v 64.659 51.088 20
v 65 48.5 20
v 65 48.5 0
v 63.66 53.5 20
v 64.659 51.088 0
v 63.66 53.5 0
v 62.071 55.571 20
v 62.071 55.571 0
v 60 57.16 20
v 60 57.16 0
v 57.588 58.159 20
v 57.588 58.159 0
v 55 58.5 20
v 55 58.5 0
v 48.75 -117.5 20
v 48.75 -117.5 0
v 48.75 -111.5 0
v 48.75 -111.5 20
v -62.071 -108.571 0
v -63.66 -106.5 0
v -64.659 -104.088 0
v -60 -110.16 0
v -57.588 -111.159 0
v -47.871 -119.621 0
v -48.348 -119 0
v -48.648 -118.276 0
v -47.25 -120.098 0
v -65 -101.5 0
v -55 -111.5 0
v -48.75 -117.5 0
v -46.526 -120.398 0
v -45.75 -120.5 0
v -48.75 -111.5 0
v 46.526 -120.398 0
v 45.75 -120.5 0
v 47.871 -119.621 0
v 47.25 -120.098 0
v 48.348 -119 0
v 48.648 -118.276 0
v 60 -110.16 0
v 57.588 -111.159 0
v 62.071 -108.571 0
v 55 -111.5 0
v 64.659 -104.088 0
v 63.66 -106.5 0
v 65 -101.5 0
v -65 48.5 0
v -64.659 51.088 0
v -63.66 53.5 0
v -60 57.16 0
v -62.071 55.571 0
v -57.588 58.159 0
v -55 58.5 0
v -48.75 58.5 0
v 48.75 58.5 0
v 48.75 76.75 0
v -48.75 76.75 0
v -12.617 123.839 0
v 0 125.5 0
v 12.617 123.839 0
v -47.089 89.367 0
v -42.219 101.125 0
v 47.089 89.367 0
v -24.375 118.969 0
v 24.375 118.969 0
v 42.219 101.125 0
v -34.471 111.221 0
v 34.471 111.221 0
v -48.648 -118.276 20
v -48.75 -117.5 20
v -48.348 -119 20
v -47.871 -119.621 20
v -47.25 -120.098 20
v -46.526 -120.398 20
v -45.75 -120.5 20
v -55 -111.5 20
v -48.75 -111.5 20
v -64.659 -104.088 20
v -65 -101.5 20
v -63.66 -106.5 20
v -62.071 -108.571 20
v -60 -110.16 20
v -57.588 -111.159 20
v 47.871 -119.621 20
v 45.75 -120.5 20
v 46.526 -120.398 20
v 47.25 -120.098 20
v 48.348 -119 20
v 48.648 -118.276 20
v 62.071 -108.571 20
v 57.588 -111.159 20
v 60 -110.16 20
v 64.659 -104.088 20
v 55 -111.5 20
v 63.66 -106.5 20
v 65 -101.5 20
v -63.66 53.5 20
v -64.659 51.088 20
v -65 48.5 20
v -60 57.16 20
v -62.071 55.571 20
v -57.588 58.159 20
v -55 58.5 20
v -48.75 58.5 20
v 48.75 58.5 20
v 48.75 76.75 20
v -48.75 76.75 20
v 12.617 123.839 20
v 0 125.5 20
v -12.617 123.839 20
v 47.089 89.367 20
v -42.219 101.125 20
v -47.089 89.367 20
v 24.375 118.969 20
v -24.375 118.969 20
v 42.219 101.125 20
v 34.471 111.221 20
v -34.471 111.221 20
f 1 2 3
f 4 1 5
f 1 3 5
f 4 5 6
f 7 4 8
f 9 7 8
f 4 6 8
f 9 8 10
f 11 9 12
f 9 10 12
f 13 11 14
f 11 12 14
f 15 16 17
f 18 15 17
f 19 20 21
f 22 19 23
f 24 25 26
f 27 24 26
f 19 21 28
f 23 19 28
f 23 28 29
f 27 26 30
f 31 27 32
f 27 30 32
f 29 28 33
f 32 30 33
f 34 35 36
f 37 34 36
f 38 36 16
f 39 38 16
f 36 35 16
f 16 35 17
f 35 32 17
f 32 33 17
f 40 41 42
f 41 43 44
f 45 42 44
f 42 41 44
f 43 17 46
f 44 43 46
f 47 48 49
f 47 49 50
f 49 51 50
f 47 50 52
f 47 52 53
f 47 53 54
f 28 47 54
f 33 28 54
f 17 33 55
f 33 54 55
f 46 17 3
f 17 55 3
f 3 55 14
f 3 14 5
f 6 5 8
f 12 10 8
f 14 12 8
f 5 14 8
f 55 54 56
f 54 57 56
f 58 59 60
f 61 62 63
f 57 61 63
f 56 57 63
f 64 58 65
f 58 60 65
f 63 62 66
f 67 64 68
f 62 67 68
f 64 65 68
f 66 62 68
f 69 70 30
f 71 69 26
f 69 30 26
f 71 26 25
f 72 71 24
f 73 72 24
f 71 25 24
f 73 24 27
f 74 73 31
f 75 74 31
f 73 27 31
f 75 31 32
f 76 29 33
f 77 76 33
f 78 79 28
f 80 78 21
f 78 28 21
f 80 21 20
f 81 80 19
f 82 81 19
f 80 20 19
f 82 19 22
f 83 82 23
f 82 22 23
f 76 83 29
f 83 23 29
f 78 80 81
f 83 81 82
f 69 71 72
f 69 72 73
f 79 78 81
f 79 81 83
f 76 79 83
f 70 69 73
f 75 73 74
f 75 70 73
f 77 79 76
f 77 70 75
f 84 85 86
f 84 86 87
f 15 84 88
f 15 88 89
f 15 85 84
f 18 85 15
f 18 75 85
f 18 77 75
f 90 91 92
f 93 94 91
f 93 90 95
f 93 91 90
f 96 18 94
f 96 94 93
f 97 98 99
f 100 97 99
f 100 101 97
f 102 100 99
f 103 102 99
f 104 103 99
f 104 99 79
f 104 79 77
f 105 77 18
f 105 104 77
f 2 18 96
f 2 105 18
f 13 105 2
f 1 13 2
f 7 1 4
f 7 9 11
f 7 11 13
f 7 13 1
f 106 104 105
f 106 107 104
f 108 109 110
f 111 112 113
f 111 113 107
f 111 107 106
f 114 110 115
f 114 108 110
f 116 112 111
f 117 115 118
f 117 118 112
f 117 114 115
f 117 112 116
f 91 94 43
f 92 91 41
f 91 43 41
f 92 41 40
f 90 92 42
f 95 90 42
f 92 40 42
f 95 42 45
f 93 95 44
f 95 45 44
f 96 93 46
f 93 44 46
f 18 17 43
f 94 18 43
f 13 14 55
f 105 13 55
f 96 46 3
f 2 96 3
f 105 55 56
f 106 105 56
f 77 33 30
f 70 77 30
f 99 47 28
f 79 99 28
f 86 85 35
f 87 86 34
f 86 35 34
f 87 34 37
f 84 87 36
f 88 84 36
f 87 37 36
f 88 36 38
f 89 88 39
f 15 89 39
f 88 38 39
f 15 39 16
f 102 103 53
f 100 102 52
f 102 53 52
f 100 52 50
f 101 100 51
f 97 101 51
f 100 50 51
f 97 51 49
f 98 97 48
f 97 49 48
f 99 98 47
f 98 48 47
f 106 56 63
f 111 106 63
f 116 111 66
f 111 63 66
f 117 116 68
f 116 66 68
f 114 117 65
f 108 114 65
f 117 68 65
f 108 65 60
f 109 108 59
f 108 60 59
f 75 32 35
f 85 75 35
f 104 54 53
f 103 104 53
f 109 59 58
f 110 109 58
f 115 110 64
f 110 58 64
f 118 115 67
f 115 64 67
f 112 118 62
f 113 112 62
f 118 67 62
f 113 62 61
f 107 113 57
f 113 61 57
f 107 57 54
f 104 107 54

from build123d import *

# Parameters (mm, degrees)
F1_DEPTH = 20


with BuildPart() as f1:
    # F0 (on Top) → F1 (new body)
    with BuildSketch(Plane.XY):
        with BuildLine():
            Line((-41.75, -120.5), (0, -120.5))
            Line((0, -120.5), (41.75, -120.5))
            ThreePointArc((41.75, -120.5), (43.164214, -119.914214), (43.75, -118.5))
            Line((43.75, -118.5), (43.75, -106.5))
            Line((43.75, -106.5), (55, -106.5))
            ThreePointArc((55, -106.5), (58.535534, -105.035534), (60, -101.5))
            Line((60, -101.5), (60, 48.5))
            ThreePointArc((60, 48.5), (58.535534, 52.035534), (55, 53.5))
            Line((55, 53.5), (43.75, 53.5))
            Line((43.75, 53.5), (43.75, 76.75))
            ThreePointArc((43.75, 76.75), (30.935922, 107.685922), (0, 120.5))
            ThreePointArc((0, 120.5), (-30.935922, 107.685922), (-43.75, 76.75))
            Line((-43.75, 76.75), (-43.75, 53.5))
            Line((-43.75, 53.5), (-55, 53.5))
            ThreePointArc((-55, 53.5), (-58.535534, 52.035534), (-60, 48.5))
            Line((-60, 48.5), (-60, -101.5))
            ThreePointArc((-60, -101.5), (-58.535534, -105.035534), (-55, -106.5))
            Line((-55, -106.5), (-43.75, -106.5))
            Line((-43.75, -106.5), (-43.75, -118.5))
            ThreePointArc((-43.75, -118.5), (-43.164214, -119.914214), (-41.75, -120.5))
        make_face()
        with BuildLine():
            Line((-45.750001, -120.5), (-41.75, -120.5))
            ThreePointArc((-41.75, -120.5), (-43.164214, -119.914214), (-43.75, -118.5))
            Line((-43.75, -118.5), (-43.75, -106.5))
            Line((-43.75, -106.5), (-55, -106.5))
            ThreePointArc((-55, -106.5), (-58.535534, -105.035534), (-60, -101.5))
            Line((-60, -101.5), (-60, 48.5))
            ThreePointArc((-60, 48.5), (-58.535534, 52.035534), (-55, 53.5))
            Line((-55, 53.5), (-43.75, 53.5))
            Line((-43.75, 53.5), (-43.75, 76.75))
            ThreePointArc((-43.75, 76.75), (-30.935922, 107.685922), (0, 120.5))
            ThreePointArc((0, 120.5), (30.935922, 107.685922), (43.75, 76.75))
            Line((43.75, 76.75), (43.75, 53.5))
            Line((43.75, 53.5), (55, 53.5))
            ThreePointArc((55, 53.5), (58.535534, 52.035534), (60, 48.5))
            Line((60, 48.5), (60, -101.5))
            ThreePointArc((60, -101.5), (58.535534, -105.035534), (55, -106.5))
            Line((55, -106.5), (43.75, -106.5))
            Line((43.75, -106.5), (43.75, -118.5))
            ThreePointArc((43.75, -118.5), (43.164214, -119.914214), (41.75, -120.5))
            Line((41.75, -120.5), (45.750001, -120.5))
            ThreePointArc((45.750001, -120.5), (47.871322, -119.62132), (48.750001, -117.5))
            Line((48.750001, -117.5), (48.750001, -111.500001))
            Line((48.750001, -111.500001), (55, -111.500001))
            ThreePointArc((55, -111.500001), (62.071069, -108.571069), (65.000001, -101.5))
            Line((65.000001, -101.5), (65.000001, 48.5))
            ThreePointArc((65.000001, 48.5), (62.071069, 55.571069), (55, 58.500001))
            Line((55, 58.500001), (48.750001, 58.500001))
            Line((48.750001, 58.500001), (48.750001, 76.75))
            ThreePointArc((48.750001, 76.75), (34.471456, 111.221456), (0, 125.500001))
            ThreePointArc((0, 125.500001), (-34.471456, 111.221456), (-48.750001, 76.75))
            Line((-48.750001, 76.75), (-48.750001, 58.500001))
            Line((-48.750001, 58.500001), (-55, 58.500001))
            ThreePointArc((-55, 58.500001), (-62.071069, 55.571069), (-65.000001, 48.5))
            Line((-65.000001, 48.5), (-65.000001, -101.5))
            ThreePointArc((-65.000001, -101.5), (-62.071069, -108.571069), (-55, -111.500001))
            Line((-55, -111.500001), (-48.750001, -111.500001))
            Line((-48.750001, -111.500001), (-48.750001, -117.5))
            ThreePointArc((-48.750001, -117.5), (-47.871322, -119.62132), (-45.750001, -120.5))
        make_face()
    extrude(amount=F1_DEPTH)


solid = f1.part
